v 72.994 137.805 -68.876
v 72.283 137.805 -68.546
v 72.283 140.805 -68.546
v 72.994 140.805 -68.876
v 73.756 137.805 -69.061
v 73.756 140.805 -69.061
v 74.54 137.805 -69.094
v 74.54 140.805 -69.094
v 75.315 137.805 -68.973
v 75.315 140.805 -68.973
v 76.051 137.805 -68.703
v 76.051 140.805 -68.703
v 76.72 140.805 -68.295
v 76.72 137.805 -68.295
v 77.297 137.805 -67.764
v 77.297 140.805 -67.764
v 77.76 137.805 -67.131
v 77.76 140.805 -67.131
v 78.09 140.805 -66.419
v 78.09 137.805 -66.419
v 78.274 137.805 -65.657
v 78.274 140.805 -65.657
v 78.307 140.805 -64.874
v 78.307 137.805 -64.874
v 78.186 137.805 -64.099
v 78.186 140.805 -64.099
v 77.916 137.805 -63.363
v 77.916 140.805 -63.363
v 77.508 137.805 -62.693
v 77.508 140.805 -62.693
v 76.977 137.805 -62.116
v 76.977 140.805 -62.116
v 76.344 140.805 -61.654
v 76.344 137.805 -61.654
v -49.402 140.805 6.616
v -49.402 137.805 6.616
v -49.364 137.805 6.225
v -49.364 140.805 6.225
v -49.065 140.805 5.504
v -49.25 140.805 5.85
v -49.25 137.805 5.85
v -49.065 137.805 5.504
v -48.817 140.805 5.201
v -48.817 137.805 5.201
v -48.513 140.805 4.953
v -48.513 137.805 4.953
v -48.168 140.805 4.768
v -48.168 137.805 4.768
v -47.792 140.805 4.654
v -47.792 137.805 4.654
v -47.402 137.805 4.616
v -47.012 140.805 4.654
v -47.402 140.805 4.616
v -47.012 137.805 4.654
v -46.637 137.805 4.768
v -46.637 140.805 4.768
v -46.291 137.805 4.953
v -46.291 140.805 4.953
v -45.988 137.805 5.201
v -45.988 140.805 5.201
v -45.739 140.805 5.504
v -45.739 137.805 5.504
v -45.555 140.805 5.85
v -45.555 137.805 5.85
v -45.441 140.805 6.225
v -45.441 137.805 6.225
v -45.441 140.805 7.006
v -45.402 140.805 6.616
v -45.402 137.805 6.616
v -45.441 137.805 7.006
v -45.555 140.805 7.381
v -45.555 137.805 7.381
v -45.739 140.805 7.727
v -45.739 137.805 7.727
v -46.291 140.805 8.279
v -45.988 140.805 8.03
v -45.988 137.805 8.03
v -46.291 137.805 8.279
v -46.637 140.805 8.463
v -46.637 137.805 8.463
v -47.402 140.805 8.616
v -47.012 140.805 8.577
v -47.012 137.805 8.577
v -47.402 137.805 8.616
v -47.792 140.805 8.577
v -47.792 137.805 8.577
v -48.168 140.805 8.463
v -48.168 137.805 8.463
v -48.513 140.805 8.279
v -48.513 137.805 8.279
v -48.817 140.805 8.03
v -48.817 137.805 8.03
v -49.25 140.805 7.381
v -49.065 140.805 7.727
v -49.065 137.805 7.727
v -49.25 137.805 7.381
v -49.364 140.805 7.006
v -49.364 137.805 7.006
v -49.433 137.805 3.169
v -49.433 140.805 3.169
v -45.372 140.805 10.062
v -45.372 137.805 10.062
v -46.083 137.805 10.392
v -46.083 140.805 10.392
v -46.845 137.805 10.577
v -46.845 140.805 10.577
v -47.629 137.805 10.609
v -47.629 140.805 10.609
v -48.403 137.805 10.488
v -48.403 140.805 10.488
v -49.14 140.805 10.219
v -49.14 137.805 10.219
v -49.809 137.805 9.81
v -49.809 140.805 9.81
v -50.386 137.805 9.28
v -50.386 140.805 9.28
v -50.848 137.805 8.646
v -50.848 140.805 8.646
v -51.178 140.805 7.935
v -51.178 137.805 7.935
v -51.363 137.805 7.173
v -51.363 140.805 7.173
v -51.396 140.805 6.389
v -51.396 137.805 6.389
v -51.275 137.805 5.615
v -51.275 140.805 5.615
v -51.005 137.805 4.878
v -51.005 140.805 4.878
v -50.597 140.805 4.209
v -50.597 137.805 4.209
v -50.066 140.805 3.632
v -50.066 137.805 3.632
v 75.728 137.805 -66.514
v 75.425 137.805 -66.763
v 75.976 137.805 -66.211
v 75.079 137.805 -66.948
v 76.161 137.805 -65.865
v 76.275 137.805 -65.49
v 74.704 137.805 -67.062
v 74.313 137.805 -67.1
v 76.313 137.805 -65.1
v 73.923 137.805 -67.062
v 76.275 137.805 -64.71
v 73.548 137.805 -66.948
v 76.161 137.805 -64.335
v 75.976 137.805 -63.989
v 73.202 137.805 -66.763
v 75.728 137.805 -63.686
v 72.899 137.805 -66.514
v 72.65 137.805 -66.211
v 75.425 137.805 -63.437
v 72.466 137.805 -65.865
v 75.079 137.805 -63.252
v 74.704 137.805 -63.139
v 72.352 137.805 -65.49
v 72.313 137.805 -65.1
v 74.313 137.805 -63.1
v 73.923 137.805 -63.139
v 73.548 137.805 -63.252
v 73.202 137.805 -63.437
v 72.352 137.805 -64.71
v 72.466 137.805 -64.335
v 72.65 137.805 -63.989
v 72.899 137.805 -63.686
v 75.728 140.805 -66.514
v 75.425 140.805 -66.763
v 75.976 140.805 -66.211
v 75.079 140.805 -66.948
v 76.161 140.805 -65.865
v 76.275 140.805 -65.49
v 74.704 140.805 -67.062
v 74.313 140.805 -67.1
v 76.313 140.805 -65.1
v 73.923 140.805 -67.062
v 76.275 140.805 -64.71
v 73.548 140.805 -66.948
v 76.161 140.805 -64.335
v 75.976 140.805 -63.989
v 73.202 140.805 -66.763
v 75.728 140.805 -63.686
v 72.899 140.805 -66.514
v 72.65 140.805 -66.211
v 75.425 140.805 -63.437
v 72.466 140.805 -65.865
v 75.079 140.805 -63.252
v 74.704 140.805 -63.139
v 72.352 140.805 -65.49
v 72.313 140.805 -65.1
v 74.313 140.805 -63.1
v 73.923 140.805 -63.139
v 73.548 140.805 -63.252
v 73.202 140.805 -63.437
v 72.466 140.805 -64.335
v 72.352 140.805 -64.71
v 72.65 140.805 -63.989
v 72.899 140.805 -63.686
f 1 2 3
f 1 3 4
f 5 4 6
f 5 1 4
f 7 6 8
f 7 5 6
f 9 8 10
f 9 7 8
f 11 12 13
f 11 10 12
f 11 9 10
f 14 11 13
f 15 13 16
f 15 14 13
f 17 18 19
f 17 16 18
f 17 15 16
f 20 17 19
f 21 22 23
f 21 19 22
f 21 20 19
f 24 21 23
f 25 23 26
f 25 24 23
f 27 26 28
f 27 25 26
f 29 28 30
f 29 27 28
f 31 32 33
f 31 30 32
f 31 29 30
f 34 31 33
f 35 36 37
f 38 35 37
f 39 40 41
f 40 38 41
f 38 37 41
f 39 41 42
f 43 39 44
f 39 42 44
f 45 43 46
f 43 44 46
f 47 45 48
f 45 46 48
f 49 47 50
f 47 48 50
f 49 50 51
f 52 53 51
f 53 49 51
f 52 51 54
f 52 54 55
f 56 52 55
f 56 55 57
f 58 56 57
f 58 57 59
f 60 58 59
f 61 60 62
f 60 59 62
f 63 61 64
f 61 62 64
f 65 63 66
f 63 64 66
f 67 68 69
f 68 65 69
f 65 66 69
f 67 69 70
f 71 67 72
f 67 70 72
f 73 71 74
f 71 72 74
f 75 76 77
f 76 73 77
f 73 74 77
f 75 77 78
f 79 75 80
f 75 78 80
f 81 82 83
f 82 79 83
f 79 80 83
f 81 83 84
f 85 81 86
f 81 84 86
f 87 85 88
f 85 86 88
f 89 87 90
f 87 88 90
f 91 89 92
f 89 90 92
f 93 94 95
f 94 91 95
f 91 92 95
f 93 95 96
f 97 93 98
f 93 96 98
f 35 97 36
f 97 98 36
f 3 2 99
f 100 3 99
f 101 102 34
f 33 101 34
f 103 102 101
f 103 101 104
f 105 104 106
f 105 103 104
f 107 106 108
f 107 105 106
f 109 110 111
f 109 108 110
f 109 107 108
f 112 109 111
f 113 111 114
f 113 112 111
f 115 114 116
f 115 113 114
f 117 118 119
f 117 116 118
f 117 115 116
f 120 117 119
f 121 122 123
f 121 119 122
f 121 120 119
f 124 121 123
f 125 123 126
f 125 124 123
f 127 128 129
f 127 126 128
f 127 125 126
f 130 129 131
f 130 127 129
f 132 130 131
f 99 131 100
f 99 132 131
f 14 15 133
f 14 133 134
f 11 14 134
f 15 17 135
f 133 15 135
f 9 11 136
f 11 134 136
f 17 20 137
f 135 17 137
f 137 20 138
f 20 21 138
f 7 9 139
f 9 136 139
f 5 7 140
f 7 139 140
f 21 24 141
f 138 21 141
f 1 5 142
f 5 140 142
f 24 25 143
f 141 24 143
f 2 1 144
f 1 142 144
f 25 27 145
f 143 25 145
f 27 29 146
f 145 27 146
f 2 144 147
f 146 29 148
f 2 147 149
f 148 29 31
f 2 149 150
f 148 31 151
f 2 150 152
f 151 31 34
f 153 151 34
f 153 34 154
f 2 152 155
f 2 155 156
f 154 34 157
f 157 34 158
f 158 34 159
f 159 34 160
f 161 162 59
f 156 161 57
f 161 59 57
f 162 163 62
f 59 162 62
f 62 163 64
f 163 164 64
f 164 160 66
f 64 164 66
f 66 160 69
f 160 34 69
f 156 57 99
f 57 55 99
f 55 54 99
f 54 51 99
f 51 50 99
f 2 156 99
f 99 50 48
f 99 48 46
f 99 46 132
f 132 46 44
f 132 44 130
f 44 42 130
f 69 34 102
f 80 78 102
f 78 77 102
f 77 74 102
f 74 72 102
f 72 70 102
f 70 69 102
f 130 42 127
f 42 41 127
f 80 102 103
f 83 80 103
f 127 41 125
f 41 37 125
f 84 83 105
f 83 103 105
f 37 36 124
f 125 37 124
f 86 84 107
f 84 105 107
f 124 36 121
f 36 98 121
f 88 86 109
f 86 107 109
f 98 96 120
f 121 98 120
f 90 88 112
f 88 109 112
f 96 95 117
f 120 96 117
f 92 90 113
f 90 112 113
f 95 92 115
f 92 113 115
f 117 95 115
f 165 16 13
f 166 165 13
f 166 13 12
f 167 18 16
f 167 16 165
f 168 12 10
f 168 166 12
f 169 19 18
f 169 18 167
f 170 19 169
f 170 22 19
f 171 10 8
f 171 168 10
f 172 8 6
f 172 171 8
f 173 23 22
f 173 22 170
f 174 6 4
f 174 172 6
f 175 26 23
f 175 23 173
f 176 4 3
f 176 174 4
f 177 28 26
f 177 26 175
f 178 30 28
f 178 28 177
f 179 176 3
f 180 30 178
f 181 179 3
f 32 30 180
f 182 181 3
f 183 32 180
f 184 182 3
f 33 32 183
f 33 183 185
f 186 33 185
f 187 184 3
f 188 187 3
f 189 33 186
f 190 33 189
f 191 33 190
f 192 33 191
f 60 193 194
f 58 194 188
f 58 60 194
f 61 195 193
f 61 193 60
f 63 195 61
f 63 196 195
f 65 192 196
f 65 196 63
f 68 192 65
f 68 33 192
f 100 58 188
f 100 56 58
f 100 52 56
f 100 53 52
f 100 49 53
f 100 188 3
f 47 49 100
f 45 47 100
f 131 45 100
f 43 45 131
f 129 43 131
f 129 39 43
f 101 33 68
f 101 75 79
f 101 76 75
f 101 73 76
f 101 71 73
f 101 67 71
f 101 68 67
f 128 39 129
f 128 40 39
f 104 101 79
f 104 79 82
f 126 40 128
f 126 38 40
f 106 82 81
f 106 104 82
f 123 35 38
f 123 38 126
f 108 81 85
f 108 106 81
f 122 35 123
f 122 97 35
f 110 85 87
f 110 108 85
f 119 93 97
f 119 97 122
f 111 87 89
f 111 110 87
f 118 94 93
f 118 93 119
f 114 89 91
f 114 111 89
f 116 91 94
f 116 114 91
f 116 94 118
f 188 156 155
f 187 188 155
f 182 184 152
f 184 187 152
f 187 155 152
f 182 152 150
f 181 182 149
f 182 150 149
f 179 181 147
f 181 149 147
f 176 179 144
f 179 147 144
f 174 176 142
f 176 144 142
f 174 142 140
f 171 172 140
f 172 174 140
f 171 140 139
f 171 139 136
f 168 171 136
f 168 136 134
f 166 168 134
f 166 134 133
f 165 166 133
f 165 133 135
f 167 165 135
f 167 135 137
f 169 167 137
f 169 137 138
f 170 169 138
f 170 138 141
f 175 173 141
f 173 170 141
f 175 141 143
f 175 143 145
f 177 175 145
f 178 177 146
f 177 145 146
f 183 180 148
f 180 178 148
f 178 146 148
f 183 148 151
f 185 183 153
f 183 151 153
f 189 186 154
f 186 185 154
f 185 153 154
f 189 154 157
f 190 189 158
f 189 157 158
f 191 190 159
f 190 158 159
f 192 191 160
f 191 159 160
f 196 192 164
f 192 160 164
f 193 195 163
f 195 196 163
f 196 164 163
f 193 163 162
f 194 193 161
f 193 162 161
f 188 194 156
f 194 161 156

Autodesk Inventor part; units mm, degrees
ref_plane "YZ Plane" through (0, 0, 0) normal (1, 0, 0) x (0, 1, 0)
ref_plane "XZ Plane" through (0, 0, 0) normal (0, 1, 0) x (-1, 0, 0)
ref_plane "XY Plane" through (0, 0, 0) normal (0, 0, 1) x (1, 0, 0)
ref_plane "Work Plane1" through (-47.4023, 137.8054, 11.1867) normal (0, 1, 0) x (-1, 0, 0)
sketch "Sketch1" plane through (-47.4023, 137.8054, 11.1867) normal (0, 1, 0) x (-1, 0, 0)
  line L0 (13.9385, 9.5711) -> (4.3301, -7.0711) projected
  line L1 (-13.9385, 9.5711) -> (13.9385, 9.5711) projected
  line L2 (-4.3301, -7.0711) -> (-13.9385, 9.5711) projected
  arc A0 (-4.3301, -7.0711) -> (4.3301, -7.0711) centre (0, -4.5711) ccw projected
  circle A1 centre (0, -4.5711) radius 2 projected
  line L3 (-115.8579, -75.4289) -> (-115.8579, -90.4289) projected
  arc A2 (-115.8579, -75.4289) -> (-120.8579, -70.4289) centre (-120.8579, -75.4289) ccw projected
  line L4 (-135.8579, -70.4289) -> (-120.8579, -70.4289) projected
  line L5 (-135.8579, -90.4289) -> (-135.8579, -70.4289) projected
  line L6 (-115.8579, -90.4289) -> (-135.8579, -90.4289) projected
  circle A3 centre (-121.7157, -76.2868) radius 2 projected
  line L7 (-121.7157, -76.2868) -> (0, -4.5711) construction
  line L8 (-119.6852, -79.7331) -> (2.0306, -8.0173)
  line L9 (-2.0306, -1.1248) -> (-123.7463, -72.8405)
  arc A4 (-123.7463, -72.8405) -> (-119.6852, -79.7331) centre (-121.7157, -76.2868) ccw
  arc A5 (2.0306, -8.0173) -> (-2.0306, -1.1248) centre (0, -4.5711) ccw
  point P0 (-47.4023, -11.1867)
  point P1 (-60.8579, -40.4289)
  dimension "d0" = 8
extrude "Extrusion1" add sketch "Sketch1" along normal blind 3 contours L8 L3 A2 L9 L2 A0 | A0 L2 L9 A5 L8 | L8 A4 L9 A2 L3
properties part number "truss final piece"
